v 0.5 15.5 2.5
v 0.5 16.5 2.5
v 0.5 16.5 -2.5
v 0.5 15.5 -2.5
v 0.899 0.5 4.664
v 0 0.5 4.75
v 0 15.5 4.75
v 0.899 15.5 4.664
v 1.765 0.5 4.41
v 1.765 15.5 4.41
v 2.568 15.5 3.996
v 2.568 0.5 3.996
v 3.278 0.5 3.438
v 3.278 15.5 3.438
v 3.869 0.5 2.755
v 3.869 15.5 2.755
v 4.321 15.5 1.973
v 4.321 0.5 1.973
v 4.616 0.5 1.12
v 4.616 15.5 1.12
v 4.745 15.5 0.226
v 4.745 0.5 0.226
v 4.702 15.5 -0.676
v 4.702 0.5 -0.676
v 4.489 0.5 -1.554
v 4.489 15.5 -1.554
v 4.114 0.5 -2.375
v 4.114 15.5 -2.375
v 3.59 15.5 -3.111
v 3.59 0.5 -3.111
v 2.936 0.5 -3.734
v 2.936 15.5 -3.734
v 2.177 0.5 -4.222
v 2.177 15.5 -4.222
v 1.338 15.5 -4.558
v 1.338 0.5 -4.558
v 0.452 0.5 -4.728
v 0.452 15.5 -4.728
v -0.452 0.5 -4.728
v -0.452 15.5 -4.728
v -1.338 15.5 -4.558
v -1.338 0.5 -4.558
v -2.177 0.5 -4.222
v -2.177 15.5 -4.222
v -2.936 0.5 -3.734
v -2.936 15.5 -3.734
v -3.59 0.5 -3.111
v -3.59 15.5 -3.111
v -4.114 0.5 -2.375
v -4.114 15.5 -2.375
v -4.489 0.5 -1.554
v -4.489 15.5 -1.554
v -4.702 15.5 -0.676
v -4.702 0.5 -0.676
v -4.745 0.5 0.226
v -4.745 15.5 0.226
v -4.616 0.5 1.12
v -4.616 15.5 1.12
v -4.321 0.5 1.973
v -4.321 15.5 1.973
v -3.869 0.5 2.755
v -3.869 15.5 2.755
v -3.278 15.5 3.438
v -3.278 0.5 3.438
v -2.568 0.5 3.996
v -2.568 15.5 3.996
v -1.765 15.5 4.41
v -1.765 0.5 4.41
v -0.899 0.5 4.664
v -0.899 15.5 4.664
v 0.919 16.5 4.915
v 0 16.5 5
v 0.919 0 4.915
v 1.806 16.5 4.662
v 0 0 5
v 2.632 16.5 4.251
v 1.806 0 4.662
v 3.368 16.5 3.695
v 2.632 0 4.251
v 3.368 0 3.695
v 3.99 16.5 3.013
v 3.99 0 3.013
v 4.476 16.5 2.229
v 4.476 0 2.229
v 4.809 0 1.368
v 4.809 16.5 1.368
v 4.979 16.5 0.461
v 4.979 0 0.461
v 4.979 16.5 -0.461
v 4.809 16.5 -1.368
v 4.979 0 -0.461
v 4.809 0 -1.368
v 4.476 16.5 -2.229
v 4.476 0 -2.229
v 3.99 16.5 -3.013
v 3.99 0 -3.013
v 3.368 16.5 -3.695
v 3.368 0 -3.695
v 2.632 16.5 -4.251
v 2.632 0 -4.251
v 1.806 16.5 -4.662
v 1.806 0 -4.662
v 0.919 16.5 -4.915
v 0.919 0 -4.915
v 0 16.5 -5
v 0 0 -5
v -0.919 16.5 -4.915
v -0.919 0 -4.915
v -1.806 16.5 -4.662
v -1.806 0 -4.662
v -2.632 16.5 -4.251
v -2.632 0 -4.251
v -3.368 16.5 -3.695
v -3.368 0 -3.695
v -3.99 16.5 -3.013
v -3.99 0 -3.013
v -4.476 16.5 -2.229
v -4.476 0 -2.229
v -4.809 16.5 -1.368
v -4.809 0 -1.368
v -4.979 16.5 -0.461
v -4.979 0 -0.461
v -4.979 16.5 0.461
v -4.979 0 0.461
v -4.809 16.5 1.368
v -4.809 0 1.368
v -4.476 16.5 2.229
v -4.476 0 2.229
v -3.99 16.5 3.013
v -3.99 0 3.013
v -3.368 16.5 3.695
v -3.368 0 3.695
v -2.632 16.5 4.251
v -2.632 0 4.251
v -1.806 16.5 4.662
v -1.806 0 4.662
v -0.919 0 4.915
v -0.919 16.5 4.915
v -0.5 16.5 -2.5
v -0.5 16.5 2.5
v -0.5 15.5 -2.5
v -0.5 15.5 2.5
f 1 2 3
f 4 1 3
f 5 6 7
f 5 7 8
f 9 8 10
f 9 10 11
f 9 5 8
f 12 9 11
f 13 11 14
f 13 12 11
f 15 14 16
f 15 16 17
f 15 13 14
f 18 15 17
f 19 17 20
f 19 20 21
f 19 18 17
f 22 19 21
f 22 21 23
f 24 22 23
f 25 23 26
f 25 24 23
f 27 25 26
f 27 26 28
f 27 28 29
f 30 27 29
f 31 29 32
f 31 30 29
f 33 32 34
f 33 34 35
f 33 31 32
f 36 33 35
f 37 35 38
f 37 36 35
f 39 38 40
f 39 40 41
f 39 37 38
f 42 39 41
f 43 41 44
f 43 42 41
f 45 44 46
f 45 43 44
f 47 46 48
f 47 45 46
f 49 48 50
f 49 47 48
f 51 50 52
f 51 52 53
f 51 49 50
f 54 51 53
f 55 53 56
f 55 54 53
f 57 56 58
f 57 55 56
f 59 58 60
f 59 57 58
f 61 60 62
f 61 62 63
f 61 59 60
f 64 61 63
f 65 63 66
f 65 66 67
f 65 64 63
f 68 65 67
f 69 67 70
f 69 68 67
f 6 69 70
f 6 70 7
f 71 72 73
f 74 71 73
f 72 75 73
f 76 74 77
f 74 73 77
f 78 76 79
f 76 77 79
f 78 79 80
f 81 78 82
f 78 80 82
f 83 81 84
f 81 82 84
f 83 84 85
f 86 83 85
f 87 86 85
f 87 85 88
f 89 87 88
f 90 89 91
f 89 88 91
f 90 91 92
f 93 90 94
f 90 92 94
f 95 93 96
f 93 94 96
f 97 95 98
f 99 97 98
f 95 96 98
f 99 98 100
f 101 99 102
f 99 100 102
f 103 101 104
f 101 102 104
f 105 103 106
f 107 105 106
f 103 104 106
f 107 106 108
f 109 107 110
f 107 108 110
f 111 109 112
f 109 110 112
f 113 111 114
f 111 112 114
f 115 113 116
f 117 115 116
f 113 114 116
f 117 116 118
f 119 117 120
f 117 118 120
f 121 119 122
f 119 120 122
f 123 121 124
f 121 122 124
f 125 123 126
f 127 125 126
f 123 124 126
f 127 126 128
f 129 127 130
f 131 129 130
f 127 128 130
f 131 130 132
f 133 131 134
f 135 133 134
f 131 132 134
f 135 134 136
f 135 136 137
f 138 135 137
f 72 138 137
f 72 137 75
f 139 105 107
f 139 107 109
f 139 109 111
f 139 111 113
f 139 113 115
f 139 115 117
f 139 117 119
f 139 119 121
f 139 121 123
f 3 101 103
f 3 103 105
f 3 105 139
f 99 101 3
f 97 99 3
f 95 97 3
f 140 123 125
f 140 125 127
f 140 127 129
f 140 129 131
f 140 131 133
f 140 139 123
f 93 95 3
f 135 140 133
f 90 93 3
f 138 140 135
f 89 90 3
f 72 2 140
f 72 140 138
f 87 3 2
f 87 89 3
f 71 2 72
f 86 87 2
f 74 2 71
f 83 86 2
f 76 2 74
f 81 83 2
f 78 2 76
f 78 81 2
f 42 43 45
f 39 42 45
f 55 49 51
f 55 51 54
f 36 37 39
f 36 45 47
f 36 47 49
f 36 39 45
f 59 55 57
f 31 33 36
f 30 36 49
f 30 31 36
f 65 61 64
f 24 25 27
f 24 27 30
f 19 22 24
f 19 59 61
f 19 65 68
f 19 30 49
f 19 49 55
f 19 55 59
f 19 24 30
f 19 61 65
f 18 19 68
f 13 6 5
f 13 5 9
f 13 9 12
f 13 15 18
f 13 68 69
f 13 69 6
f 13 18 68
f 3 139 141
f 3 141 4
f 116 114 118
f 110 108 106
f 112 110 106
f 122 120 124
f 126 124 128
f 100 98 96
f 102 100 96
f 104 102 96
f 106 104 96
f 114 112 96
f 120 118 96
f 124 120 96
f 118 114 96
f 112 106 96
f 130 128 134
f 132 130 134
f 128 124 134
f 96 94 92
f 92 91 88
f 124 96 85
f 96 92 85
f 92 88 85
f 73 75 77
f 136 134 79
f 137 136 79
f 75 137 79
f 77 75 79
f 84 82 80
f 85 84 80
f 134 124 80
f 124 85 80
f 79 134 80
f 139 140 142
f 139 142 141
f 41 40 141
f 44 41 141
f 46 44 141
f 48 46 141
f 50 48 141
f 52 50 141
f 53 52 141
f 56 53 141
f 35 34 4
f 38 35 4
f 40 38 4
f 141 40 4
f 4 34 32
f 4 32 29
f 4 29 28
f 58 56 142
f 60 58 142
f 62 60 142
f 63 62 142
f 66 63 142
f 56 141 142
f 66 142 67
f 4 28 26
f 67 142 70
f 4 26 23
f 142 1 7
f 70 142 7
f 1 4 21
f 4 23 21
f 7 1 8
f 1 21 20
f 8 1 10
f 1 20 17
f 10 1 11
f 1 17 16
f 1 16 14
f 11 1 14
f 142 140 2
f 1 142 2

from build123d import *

# Parameters (mm, degrees)
ESBO_O1_R                = 5
RESSALTO_EXTRUS_O1_DEPTH = 1
ESBO_O3_R                = 5
RESSALTO_EXTRUS_O3_DEPTH = 15
CORTE_EXTRUS_O2_START    = -15
ESBO_O4_R                = 4.75
CORTE_EXTRUS_O2_DEPTH    = 15
ESBO_O5_R                = 5
RESSALTO_EXTRUS_O4_DEPTH = 1
ESBO_O6_W                = 1
ESBO_O6_H                = 5
CORTE_EXTRUS_O3_DEPTH    = 1


with BuildPart() as part:
    # Esboço1 → Ressalto-extrusão1 (new body)
    with BuildSketch(Plane(origin=(0, 0, 0), x_dir=(1, 0, 0), z_dir=(0, 1, 0))):
        with Locations(Location((0, 0, 0), (0, 0, 270))):
            Circle(ESBO_O1_R)
    extrude(amount=RESSALTO_EXTRUS_O1_DEPTH)

    # Esboço3 → Ressalto-extrusão3 (add)
    with BuildSketch(Plane(origin=(0, 0.5, 0), x_dir=(1, 0, 0), z_dir=(0, 1, 0))):
        with Locations(Location((0, 0, 0), (0, 0, 270))):
            Circle(ESBO_O3_R)
    extrude(amount=RESSALTO_EXTRUS_O3_DEPTH)

    # Esboço4 → Corte-extrusão2 (cut)
    with BuildSketch(Plane(origin=(0, 15.5, 0), x_dir=(1, 0, 0), z_dir=(0, 1, 0)).offset(CORTE_EXTRUS_O2_START)):
        with Locations(Location((0, 0, 0), (0, 0, 270))):
            Circle(ESBO_O4_R)
    extrude(amount=CORTE_EXTRUS_O2_DEPTH, mode=Mode.SUBTRACT)

    # Esboço5 → Ressalto-extrusão4 (add)
    with BuildSketch(Plane(origin=(0, 15.5, 0), x_dir=(1, 0, 0), z_dir=(0, 1, 0))):
        with Locations(Location((0, 0, 0), (0, 0, 270))):
            Circle(ESBO_O5_R)
    extrude(amount=RESSALTO_EXTRUS_O4_DEPTH)

    # Esboço6 → Corte-extrusão3 (cut)
    with BuildSketch(Plane(origin=(0, 16.5, 0), x_dir=(1, 0, 0), z_dir=(0, 1, 0))):
        Rectangle(ESBO_O6_W, ESBO_O6_H)
    extrude(amount=-CORTE_EXTRUS_O3_DEPTH, mode=Mode.SUBTRACT)


solid = part.part
